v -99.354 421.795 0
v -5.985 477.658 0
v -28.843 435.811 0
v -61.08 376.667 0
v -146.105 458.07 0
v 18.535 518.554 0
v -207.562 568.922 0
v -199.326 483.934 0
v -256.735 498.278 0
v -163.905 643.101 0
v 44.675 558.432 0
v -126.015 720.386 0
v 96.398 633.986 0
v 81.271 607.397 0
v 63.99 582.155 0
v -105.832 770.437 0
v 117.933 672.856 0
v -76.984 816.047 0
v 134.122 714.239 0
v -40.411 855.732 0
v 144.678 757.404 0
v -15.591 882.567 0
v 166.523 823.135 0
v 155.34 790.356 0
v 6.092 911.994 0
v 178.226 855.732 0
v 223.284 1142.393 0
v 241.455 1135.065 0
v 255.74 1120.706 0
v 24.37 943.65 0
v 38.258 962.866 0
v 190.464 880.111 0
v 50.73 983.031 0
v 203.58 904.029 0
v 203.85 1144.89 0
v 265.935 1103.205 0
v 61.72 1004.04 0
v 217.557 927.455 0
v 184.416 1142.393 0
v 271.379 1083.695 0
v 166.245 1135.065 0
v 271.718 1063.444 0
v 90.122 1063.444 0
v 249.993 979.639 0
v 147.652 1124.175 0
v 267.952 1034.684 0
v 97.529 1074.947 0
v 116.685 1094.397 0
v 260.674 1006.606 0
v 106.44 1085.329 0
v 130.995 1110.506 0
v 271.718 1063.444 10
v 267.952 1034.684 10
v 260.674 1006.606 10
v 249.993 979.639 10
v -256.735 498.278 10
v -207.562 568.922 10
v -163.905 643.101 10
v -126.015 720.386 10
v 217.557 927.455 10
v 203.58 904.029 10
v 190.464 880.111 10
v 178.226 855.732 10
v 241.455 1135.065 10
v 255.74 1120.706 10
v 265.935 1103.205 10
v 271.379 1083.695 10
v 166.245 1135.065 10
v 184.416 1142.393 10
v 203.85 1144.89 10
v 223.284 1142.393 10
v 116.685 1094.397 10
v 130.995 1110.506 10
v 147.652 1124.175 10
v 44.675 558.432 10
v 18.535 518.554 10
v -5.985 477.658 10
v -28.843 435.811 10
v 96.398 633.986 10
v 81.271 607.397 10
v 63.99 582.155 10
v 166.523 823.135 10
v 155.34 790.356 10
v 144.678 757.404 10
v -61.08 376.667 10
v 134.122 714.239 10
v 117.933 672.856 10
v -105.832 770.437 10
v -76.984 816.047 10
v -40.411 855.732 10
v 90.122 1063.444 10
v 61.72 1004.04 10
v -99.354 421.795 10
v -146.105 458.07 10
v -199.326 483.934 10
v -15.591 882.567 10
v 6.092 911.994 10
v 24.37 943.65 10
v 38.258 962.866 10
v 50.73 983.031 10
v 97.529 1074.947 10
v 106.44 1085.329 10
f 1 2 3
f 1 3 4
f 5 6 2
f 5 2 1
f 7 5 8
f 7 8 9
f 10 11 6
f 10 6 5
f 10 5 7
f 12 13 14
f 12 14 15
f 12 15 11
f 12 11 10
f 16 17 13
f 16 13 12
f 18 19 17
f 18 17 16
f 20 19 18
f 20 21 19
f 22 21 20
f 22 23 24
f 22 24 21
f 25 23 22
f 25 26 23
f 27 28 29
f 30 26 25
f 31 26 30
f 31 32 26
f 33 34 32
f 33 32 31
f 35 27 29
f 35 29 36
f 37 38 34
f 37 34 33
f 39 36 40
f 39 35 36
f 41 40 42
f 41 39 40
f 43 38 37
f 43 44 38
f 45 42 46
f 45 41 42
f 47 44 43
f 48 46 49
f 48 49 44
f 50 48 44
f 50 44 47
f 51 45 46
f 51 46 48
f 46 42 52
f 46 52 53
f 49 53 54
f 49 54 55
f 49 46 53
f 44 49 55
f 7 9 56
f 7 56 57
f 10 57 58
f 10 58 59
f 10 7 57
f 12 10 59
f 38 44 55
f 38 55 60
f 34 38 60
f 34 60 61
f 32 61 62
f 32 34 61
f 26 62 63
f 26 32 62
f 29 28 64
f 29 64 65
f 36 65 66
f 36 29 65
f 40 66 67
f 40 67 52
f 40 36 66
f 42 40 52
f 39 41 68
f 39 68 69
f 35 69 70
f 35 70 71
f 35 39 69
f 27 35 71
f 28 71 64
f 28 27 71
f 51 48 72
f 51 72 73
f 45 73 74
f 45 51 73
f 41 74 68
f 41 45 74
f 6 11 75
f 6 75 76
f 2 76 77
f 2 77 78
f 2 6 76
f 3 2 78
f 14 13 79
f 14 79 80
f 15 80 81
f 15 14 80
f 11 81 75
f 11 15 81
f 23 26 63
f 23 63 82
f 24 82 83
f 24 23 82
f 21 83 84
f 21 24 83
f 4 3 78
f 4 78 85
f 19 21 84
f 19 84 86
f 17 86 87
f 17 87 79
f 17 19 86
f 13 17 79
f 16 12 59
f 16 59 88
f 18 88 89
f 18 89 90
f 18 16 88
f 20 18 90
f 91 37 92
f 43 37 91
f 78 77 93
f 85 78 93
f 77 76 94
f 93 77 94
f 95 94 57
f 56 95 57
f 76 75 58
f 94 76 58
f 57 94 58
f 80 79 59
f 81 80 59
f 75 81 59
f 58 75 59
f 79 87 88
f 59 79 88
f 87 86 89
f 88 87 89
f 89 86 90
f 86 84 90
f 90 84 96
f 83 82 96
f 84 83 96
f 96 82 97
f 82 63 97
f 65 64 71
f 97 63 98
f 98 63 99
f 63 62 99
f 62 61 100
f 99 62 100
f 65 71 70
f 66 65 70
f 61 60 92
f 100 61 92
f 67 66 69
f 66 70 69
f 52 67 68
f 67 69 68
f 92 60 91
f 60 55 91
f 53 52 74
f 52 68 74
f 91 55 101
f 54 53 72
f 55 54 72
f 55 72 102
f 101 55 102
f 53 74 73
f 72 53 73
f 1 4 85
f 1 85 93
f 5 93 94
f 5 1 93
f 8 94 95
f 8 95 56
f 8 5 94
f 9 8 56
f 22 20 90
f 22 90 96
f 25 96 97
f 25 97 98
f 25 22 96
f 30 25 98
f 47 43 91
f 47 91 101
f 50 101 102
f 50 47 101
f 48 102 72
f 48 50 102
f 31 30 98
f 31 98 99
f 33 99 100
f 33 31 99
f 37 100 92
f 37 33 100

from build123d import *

# Parameters (mm, degrees)
BOSS_EXTRUDE3_DEPTH = 10


with BuildPart() as part:
    # Sketch1 → Boss-Extrude3 (new body)
    with BuildSketch(Plane.XY):
        with BuildLine():
            Line((61.719673081, 1004.040138522), (90.121595591, 1063.443540058))
            ThreePointArc((90.121595591, 1063.443540058), (101.806598129, 1080.290626418), (116.685466786, 1094.39675525))
            ThreePointArc((116.685466786, 1094.39675525), (139.054779467, 1117.668267819), (166.244818626, 1135.065141607))
            ThreePointArc((166.244818626, 1135.065141607), (203.849887916, 1144.889885631), (241.454957205, 1135.065141607))
            ThreePointArc((241.454957205, 1135.065141607), (265.935060661, 1103.204515558), (271.717774961, 1063.443540058))
            ThreePointArc((271.717774961, 1063.443540058), (264.746706267, 1020.532699182), (249.993176003, 979.639308419))
            Line((249.993176003, 979.639308419), (217.557058689, 927.454623329))
            ThreePointArc((217.557058689, 927.454623329), (196.913476553, 892.129764254), (178.225545137, 855.732451558))
            ThreePointArc((178.225545137, 855.732451558), (160.866603962, 806.767718632), (144.678077696, 757.403667679))
            ThreePointArc((144.678077696, 757.403667679), (126.716261258, 693.277809244), (96.398038564, 633.985668597))
            ThreePointArc((96.398038564, 633.985668597), (72.892497642, 594.596356166), (44.675436223, 558.432481475))
            ThreePointArc((44.675436223, 558.432481475), (6.069688965, 498.228600511), (-28.843305621, 435.810703931))
            Line((-28.843305621, 435.810703931), (-61.080316316, 376.666682759))
            ThreePointArc((-61.080316316, 376.666682759), (-146.105172251, 458.069534428), (-256.734722378, 498.278401925))
            ThreePointArc((-256.734722378, 498.278401925), (-185.027496066, 605.596315922), (-126.015280279, 720.385772571))
            ThreePointArc((-126.015280279, 720.385772571), (-92.438560876, 793.893867743), (-40.411397842, 855.732451558))
            ThreePointArc((-40.411397842, 855.732451558), (-4.339376244, 896.978618456), (24.369918596, 943.649952439))
            ThreePointArc((24.369918596, 943.649952439), (44.675436223, 972.836536947), (61.719673081, 1004.040138522))
        make_face()
    extrude(amount=BOSS_EXTRUDE3_DEPTH)


solid = part.part
